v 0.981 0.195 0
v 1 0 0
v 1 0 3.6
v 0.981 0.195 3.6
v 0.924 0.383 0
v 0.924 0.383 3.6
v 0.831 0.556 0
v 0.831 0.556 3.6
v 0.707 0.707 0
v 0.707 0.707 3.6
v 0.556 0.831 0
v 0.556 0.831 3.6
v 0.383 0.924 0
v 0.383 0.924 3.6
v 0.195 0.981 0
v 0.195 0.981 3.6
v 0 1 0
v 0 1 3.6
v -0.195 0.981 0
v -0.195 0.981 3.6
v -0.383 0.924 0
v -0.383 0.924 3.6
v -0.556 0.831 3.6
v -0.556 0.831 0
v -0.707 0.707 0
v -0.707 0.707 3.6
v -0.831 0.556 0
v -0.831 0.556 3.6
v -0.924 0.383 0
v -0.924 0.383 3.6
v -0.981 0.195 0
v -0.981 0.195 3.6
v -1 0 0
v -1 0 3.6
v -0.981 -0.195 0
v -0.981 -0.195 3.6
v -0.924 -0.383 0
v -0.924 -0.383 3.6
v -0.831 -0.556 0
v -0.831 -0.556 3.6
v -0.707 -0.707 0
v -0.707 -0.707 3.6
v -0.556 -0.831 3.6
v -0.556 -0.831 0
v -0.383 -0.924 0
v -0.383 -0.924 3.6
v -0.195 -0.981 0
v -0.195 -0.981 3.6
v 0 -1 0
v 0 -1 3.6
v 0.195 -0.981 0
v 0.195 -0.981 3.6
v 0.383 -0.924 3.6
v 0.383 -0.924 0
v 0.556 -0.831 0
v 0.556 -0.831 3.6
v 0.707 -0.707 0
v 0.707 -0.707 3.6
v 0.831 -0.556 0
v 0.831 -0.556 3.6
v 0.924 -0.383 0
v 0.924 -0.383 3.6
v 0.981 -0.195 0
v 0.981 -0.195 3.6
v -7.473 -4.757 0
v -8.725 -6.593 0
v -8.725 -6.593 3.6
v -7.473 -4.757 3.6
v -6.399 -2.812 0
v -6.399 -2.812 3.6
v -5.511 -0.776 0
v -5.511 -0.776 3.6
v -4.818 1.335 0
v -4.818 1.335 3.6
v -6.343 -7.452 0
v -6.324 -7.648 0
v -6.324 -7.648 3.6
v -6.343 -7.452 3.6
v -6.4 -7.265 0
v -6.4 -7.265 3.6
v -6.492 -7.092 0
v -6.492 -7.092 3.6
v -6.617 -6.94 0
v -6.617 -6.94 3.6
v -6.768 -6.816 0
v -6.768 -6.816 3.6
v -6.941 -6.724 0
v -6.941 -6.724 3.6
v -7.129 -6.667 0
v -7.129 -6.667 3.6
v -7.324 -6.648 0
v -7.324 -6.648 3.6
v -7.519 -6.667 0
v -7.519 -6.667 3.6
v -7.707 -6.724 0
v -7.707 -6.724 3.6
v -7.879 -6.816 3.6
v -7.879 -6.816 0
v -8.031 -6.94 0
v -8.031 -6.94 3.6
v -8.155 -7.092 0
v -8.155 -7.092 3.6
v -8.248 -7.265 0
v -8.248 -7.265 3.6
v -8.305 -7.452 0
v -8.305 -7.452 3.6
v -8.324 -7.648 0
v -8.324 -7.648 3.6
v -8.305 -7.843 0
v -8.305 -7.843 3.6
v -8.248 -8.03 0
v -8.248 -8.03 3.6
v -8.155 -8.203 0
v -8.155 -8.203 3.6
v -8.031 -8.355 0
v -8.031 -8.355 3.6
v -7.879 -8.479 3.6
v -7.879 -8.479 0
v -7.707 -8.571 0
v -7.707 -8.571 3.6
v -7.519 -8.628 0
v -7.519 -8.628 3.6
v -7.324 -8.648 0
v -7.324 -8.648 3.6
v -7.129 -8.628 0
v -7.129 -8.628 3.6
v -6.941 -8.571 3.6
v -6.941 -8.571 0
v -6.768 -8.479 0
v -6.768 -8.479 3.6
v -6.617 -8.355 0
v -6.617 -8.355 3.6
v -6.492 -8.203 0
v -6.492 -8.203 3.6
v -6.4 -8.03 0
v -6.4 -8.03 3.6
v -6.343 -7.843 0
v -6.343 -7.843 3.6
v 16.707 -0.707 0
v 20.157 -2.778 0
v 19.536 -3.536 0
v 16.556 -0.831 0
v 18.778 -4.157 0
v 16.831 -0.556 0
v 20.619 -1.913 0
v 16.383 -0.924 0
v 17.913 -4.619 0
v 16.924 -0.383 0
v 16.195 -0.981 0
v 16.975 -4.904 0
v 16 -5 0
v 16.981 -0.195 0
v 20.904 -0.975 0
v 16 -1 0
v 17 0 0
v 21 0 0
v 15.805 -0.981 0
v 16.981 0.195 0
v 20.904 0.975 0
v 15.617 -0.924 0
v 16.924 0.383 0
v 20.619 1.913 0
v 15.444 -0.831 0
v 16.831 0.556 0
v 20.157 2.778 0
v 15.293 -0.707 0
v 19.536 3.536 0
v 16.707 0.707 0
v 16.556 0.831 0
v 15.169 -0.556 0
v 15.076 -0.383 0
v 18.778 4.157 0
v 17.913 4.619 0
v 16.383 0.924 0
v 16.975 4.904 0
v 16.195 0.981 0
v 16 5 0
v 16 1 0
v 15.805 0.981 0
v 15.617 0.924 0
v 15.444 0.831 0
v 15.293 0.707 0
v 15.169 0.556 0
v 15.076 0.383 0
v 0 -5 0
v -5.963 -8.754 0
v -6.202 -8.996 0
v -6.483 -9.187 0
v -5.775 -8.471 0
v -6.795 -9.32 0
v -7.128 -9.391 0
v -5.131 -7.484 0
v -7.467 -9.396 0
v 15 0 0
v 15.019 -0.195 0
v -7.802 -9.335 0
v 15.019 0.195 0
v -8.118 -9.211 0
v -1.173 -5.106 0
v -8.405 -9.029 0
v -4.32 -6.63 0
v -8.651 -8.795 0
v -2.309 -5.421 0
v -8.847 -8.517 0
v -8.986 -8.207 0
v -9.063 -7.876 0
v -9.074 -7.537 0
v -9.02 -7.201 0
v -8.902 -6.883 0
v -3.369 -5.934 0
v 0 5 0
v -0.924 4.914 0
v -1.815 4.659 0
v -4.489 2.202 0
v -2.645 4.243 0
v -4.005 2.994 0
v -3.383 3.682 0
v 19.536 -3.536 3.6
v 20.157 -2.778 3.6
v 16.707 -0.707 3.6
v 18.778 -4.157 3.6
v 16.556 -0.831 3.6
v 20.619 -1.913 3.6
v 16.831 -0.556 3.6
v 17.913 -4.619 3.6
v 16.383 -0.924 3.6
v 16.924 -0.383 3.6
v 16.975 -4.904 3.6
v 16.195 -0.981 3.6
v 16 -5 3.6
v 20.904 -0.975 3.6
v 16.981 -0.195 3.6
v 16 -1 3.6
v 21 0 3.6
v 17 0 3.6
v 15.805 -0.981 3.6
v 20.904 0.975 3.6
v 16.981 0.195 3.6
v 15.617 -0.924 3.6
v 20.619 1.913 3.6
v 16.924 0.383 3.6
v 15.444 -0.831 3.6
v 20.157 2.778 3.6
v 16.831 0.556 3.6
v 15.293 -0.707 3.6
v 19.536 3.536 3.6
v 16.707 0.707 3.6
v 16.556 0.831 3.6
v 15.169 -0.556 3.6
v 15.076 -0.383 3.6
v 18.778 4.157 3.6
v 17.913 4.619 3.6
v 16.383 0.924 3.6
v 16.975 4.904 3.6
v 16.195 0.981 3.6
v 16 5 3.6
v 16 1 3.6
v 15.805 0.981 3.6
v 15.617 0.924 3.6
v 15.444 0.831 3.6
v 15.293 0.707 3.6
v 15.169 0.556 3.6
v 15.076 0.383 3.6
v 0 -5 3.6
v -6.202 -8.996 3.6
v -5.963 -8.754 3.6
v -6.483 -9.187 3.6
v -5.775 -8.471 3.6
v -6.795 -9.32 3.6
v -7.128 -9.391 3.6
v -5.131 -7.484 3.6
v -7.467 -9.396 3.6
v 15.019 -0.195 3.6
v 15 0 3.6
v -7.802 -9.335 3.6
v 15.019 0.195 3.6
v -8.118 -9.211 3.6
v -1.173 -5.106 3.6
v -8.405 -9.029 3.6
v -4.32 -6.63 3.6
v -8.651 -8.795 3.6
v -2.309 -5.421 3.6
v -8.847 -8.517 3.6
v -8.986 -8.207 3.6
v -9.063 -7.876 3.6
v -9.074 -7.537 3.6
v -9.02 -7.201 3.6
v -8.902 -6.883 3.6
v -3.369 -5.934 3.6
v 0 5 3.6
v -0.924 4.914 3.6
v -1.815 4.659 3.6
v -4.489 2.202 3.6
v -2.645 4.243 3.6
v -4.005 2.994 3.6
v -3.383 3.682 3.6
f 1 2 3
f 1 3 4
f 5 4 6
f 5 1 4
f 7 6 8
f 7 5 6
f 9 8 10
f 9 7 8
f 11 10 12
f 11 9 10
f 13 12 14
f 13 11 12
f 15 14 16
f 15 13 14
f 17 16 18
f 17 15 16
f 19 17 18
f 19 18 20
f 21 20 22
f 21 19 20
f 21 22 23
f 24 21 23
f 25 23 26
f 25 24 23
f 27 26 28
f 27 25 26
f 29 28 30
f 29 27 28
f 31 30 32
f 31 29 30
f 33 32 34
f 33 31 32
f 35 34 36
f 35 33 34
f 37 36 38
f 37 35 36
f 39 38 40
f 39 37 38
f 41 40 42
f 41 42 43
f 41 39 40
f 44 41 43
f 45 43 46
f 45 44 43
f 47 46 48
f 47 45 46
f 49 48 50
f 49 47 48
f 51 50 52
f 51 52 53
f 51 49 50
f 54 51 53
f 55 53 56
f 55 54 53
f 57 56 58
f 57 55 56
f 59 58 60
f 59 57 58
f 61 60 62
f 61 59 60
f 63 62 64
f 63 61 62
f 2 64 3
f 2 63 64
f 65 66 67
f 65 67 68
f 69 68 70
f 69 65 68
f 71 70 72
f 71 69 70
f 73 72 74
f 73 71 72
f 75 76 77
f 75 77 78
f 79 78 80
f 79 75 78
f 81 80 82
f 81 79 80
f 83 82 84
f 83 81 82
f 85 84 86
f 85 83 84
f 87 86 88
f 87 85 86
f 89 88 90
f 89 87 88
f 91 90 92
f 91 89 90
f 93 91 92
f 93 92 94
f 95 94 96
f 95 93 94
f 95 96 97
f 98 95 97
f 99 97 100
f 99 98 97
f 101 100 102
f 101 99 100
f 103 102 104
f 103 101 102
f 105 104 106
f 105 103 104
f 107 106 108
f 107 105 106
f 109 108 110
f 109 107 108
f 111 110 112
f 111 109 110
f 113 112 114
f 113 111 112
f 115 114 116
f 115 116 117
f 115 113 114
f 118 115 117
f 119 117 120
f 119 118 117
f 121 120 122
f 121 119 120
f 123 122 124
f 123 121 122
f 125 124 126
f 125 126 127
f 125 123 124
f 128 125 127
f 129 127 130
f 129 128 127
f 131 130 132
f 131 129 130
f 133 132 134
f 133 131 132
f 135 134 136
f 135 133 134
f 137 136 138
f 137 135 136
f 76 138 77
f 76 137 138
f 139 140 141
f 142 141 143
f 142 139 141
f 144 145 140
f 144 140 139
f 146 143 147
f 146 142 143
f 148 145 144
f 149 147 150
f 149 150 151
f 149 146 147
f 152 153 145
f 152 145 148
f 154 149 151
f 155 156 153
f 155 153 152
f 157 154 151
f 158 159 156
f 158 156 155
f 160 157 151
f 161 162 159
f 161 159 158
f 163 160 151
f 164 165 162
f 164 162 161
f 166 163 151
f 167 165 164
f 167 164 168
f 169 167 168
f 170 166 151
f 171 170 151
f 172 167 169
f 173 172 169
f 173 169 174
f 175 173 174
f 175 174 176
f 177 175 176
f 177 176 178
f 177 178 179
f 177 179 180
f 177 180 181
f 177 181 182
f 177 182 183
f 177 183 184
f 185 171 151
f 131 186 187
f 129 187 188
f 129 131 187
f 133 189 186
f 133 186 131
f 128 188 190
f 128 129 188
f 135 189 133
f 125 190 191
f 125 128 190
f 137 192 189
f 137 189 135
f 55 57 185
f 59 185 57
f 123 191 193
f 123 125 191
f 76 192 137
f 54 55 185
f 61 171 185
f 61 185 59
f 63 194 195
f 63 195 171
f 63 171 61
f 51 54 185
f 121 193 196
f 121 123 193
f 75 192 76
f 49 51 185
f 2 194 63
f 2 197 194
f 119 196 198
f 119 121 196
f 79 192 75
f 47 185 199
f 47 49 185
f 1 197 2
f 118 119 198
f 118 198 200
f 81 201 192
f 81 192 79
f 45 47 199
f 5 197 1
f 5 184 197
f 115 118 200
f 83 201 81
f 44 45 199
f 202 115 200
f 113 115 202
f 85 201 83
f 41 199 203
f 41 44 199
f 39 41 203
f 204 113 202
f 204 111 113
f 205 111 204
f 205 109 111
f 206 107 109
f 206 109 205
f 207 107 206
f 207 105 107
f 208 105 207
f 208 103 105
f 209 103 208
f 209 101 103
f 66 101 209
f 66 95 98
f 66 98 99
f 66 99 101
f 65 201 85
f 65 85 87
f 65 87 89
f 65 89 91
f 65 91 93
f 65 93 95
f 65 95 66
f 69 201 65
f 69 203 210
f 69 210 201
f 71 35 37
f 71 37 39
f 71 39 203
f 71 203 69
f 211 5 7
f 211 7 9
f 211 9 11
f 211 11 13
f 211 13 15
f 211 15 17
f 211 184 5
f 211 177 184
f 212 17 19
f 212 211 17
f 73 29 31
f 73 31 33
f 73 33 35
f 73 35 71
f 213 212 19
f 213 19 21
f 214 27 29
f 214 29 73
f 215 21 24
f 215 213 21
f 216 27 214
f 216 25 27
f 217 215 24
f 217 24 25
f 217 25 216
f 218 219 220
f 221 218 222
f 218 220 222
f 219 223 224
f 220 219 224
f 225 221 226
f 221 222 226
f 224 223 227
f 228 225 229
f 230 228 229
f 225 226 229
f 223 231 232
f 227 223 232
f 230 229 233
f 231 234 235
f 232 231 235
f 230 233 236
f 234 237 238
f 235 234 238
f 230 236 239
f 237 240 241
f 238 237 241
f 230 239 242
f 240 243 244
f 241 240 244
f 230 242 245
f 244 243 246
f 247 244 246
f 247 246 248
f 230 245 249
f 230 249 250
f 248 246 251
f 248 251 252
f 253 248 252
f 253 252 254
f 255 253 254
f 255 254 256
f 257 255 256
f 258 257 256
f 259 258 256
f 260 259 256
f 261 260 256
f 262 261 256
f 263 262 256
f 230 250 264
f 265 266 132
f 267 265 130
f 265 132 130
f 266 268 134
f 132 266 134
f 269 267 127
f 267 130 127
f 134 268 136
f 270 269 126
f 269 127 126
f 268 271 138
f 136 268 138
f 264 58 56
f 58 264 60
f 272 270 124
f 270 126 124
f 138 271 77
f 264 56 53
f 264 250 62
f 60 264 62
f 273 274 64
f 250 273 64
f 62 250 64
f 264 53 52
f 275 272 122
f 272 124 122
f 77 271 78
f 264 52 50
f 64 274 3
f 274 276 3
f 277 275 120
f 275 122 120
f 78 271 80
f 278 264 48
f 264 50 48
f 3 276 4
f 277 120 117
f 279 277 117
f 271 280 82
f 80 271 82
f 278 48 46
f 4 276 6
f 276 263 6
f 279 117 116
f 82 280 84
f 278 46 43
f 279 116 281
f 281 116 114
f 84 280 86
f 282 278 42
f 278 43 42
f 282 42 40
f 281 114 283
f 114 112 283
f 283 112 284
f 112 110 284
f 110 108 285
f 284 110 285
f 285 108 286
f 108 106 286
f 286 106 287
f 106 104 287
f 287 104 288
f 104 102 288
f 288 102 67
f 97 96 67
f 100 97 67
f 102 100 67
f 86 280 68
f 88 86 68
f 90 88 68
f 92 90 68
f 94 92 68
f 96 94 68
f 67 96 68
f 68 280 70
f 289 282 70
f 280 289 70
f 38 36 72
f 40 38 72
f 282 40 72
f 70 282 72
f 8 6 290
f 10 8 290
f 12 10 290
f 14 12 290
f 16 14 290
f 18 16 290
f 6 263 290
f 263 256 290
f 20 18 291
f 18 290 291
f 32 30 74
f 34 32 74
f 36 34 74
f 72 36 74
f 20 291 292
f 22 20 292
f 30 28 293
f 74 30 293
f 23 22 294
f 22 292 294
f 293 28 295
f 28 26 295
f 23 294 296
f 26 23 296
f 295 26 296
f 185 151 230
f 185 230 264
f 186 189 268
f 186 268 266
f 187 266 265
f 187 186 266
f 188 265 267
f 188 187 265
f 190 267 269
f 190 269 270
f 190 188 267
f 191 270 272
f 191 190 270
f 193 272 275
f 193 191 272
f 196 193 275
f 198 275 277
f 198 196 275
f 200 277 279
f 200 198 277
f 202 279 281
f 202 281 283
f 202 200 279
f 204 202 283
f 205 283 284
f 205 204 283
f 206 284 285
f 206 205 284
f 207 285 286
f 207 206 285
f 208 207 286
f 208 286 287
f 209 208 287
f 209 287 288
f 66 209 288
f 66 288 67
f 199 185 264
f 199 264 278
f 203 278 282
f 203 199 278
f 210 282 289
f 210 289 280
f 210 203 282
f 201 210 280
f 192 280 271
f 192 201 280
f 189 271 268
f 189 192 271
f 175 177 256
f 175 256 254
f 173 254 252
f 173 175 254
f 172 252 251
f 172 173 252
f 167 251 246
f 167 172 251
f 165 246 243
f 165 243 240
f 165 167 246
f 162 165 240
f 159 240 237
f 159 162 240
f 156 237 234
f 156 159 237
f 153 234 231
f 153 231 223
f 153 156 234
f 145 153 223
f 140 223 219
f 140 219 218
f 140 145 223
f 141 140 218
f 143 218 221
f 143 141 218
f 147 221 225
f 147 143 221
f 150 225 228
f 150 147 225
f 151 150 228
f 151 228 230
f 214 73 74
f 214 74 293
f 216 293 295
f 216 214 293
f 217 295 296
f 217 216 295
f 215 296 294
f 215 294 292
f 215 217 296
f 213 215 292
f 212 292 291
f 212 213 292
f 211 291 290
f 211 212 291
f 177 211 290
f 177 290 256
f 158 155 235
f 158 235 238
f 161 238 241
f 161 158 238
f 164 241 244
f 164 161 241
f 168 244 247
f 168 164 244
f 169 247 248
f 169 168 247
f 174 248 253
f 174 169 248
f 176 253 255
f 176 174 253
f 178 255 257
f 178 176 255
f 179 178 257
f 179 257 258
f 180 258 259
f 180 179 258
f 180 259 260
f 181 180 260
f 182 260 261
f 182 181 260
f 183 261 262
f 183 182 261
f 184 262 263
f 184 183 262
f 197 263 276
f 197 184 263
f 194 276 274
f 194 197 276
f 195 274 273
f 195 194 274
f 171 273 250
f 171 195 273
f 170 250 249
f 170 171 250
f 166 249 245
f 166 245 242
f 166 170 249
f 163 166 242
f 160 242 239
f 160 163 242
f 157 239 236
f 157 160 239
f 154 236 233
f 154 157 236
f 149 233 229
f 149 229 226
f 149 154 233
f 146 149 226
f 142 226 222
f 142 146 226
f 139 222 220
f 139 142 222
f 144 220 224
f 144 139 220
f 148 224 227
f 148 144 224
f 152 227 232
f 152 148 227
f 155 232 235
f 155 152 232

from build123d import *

# Parameters (mm, degrees)
SKETCH1_R           = 1
BOSS_EXTRUDE1_DEPTH = 3.6


with BuildPart() as part:
    # Sketch1 → Boss-Extrude1 (new body)
    with BuildSketch(Plane.XY):
        with BuildLine():
            Line((0, 5), (16, 5))
            ThreePointArc((16, 5), (21, 0), (16, -5))
            Line((16, -5), (0, -5))
            ThreePointArc((0, -5), (-3.368878467, -5.934437461), (-5.775069682, -8.470725956))
            ThreePointArc((-5.775069682, -8.470725956), (-8.265817764, -9.127128459), (-8.725078251, -6.592612716))
            ThreePointArc((-8.725078251, -6.592612716), (-6.399016419, -2.812300799), (-4.818388045, 1.335341397))
            ThreePointArc((-4.818388045, 1.335341397), (-3.026821189, 3.979742893), (0, 5))
        make_face()
        with Locations((-7.323866259, -7.647577093)):
            Circle(SKETCH1_R, mode=Mode.SUBTRACT)
        Circle(SKETCH1_R, mode=Mode.SUBTRACT)
        with Locations((16, 0)):
            Circle(SKETCH1_R, mode=Mode.SUBTRACT)
    extrude(amount=BOSS_EXTRUDE1_DEPTH)


solid = part.part
